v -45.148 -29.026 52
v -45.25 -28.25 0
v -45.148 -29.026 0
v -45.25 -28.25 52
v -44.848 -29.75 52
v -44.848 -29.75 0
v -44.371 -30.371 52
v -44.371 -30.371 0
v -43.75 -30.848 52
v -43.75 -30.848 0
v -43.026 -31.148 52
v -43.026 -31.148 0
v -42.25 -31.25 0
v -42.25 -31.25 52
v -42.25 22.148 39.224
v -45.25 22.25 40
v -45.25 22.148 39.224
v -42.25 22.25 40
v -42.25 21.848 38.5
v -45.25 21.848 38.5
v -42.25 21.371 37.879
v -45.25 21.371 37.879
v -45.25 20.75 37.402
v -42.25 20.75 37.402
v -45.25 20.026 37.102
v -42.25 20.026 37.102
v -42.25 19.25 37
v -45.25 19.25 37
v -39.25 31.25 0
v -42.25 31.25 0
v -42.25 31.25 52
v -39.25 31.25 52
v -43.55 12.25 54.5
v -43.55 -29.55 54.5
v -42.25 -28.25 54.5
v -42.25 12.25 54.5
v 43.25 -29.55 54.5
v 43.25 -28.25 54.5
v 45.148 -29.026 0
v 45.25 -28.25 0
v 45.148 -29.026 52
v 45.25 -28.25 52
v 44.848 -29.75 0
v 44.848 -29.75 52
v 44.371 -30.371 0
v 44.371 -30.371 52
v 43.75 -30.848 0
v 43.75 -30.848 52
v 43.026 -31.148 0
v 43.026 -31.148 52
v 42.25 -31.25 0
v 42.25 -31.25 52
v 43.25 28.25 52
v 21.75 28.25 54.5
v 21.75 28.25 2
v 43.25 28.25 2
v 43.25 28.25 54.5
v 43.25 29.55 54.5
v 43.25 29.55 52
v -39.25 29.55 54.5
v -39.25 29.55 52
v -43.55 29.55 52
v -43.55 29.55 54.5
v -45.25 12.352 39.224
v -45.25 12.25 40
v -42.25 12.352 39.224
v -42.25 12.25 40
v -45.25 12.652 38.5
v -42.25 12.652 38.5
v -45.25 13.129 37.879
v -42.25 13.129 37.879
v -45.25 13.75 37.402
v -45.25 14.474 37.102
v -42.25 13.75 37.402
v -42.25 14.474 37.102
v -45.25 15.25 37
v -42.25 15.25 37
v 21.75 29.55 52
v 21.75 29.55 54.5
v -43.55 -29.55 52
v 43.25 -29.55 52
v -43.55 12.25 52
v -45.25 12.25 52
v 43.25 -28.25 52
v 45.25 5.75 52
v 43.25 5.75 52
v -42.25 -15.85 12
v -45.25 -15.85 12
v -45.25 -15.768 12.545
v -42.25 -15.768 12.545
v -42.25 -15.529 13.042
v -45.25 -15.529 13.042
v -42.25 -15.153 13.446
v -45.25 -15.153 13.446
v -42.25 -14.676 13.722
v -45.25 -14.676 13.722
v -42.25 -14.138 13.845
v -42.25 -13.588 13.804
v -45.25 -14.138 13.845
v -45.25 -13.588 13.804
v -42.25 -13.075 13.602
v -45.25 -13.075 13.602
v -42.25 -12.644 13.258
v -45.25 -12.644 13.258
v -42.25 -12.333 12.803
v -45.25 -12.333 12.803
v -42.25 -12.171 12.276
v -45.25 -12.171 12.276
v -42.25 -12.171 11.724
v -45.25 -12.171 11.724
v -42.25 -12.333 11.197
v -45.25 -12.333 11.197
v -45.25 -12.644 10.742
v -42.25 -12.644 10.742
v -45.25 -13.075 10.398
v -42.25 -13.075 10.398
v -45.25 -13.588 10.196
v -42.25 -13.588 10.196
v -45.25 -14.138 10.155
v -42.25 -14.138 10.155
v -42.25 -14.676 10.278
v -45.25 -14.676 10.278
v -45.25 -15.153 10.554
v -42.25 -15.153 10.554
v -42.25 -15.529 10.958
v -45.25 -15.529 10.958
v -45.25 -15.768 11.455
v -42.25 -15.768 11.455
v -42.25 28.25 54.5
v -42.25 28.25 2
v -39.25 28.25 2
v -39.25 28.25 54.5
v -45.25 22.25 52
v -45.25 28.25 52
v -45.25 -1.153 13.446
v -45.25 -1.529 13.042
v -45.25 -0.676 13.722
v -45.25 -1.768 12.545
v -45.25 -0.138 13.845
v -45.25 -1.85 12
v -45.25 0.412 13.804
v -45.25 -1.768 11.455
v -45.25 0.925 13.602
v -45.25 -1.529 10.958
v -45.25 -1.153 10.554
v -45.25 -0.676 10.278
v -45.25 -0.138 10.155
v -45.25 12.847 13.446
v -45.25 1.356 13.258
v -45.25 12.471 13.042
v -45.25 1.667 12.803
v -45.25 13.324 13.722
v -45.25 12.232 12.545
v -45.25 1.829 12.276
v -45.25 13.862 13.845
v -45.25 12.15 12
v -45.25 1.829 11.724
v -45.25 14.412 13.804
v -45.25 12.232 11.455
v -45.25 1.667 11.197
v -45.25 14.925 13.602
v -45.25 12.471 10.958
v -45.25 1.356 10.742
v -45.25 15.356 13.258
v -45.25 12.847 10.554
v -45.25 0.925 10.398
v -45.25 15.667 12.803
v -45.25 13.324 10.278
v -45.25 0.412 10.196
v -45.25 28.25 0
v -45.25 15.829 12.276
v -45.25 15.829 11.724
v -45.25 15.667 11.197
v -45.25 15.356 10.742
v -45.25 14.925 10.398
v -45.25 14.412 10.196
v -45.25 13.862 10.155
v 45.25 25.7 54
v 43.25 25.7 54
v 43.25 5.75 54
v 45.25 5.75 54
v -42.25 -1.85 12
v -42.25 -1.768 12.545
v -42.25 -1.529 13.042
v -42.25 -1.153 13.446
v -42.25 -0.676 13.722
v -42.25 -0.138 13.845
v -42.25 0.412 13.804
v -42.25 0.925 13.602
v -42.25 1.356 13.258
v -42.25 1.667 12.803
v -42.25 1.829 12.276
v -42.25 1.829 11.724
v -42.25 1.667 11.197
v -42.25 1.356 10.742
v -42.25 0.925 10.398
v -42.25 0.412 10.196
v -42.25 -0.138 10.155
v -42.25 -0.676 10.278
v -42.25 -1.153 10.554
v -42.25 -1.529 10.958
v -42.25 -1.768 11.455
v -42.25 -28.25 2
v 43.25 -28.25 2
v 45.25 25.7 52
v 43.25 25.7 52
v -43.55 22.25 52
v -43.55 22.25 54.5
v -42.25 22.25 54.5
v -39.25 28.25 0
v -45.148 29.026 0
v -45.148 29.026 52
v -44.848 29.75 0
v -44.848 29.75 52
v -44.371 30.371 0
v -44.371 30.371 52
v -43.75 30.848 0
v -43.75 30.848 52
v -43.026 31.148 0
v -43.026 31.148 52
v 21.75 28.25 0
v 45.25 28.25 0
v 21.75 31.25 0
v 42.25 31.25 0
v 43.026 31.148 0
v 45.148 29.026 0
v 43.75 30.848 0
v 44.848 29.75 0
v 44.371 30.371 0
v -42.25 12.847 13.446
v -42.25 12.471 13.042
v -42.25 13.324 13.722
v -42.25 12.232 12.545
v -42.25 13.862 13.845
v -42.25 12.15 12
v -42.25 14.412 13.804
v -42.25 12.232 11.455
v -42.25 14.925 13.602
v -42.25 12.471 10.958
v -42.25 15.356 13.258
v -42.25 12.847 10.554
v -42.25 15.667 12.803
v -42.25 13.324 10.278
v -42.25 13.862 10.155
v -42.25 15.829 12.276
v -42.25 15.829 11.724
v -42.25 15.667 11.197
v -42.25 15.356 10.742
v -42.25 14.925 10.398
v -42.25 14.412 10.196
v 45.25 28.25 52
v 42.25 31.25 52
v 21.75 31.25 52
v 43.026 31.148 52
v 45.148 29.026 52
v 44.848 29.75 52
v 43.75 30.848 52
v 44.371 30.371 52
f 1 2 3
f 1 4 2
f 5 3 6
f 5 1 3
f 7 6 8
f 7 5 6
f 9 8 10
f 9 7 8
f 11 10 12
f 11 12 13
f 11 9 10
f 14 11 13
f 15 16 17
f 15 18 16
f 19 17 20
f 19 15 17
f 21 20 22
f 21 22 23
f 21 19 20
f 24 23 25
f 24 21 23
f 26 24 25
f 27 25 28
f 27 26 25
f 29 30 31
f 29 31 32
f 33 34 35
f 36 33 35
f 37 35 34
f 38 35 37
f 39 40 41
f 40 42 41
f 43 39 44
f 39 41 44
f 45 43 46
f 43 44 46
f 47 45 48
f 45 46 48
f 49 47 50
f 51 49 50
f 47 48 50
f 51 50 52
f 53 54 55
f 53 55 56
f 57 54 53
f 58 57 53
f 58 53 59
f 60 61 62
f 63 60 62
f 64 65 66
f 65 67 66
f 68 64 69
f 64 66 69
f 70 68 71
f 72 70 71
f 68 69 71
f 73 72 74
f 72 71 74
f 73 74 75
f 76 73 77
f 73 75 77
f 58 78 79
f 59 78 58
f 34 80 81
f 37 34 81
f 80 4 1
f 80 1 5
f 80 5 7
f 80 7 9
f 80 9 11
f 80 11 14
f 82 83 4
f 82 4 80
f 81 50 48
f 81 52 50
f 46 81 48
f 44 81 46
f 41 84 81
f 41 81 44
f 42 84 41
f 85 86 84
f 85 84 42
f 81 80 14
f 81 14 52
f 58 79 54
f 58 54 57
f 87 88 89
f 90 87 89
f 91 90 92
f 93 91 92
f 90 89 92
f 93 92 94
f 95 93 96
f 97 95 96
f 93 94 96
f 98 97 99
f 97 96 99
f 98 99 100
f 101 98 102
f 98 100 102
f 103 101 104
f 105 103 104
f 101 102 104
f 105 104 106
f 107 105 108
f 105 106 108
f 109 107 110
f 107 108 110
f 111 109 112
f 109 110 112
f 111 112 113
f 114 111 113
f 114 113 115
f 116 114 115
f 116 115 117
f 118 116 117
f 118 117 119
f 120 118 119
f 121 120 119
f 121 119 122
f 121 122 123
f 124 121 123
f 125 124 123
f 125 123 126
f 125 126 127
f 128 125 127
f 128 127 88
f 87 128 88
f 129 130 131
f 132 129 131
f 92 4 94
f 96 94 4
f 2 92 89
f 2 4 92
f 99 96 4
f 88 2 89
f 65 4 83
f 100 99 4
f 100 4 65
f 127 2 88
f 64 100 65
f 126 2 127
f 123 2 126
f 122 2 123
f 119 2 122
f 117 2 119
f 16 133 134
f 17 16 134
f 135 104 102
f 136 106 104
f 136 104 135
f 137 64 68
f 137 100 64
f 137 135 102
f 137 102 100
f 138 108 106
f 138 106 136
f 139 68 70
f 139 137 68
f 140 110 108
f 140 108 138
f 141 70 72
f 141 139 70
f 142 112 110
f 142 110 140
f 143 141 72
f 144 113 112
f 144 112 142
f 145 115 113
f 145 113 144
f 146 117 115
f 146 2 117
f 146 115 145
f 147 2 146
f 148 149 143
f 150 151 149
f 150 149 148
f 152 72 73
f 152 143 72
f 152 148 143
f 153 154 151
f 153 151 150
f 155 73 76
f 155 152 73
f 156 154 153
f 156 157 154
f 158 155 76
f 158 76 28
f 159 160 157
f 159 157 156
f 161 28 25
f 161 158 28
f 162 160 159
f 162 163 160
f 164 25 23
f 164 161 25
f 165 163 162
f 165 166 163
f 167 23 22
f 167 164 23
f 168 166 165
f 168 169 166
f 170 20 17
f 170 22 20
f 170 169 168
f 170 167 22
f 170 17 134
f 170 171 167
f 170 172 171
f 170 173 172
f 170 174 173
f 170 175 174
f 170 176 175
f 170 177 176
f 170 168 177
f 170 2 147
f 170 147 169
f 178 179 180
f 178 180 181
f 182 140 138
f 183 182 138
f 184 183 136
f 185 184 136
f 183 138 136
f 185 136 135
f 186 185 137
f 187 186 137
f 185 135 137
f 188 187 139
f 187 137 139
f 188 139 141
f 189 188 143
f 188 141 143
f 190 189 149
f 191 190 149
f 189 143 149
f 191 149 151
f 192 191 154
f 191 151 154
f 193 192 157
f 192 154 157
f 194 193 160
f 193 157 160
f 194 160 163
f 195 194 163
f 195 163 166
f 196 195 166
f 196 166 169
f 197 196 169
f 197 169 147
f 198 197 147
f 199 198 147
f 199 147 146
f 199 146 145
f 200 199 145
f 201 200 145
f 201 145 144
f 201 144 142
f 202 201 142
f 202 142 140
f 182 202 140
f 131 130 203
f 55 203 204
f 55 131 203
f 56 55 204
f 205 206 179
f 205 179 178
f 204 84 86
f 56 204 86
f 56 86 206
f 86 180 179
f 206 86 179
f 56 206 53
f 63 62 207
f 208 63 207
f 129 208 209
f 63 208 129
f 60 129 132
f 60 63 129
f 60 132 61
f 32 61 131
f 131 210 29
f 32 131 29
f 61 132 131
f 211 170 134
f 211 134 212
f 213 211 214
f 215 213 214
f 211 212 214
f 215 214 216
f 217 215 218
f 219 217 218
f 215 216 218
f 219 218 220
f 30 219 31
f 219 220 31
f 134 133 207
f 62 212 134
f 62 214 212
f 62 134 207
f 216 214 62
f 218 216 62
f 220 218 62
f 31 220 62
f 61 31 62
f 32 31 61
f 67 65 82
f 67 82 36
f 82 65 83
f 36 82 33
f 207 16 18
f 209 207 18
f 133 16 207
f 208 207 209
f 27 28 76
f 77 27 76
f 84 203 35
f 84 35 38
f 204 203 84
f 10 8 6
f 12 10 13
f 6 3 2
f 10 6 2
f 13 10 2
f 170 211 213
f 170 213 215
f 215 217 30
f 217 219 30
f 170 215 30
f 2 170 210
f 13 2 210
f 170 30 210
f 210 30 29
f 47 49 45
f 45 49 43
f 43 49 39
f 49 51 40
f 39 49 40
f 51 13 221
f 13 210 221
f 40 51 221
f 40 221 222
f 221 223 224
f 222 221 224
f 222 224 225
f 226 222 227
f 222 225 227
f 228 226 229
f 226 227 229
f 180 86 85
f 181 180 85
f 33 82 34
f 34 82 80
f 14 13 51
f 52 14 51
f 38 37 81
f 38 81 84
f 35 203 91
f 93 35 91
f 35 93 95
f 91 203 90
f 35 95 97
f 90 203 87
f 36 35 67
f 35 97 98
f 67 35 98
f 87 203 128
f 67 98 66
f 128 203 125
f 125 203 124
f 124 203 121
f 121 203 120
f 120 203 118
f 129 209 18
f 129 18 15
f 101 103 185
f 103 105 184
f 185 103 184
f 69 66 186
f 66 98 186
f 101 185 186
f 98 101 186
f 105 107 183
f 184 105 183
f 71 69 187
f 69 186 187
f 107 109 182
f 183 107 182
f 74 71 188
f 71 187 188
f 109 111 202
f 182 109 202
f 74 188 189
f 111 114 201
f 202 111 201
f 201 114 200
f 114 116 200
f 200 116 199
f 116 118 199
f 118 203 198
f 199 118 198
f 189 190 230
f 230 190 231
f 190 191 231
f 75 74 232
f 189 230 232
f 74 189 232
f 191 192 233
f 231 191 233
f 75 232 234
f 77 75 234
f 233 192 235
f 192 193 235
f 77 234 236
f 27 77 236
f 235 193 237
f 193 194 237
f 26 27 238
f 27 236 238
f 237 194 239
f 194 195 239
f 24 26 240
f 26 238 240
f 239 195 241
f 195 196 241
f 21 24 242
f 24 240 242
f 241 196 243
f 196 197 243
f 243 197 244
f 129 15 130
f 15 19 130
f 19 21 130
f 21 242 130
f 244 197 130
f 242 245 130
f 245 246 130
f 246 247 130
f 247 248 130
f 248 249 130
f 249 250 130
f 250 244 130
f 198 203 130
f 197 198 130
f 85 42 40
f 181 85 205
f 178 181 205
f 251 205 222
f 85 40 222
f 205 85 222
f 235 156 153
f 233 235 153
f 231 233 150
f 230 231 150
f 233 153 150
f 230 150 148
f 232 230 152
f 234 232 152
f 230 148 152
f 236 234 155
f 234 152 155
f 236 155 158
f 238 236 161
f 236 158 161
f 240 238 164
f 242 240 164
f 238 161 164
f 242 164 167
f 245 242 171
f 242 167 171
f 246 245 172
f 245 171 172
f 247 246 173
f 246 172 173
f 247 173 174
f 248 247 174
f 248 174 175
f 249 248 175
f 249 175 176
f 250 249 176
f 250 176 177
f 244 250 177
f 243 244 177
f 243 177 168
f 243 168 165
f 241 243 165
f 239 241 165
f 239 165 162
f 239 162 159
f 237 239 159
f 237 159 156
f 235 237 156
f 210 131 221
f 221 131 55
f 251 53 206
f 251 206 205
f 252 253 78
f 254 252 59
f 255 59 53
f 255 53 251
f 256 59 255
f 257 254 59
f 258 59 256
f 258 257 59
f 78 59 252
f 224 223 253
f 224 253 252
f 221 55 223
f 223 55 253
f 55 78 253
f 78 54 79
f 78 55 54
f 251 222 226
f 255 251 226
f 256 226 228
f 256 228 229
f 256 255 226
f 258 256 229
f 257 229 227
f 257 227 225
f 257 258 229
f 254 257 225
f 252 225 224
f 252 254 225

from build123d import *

# Parameters (mm, degrees)
SKETCH_W        = 90.5
SKETCH_H        = 62.5
PAD_DEPTH       = 52
SKETCH001_W     = 85.5
SKETCH001_H     = 56.5
POCKET_DEPTH    = 50
SKETCH002_W     = 61
SKETCH002_H     = 3
POCKET001_DEPTH = 52
SKETCH003_W     = 3
SKETCH003_H     = 1.3
SKETCH003_W_2   = 1.3
SKETCH003_H_2   = 57.8
SKETCH003_W_3   = 86.8
SKETCH003_W_4   = 21.5
PAD001_DEPTH    = 2.5
SKETCH004_W     = 2
SKETCH004_H     = 19.95
PAD002_DEPTH    = 2
PAD003_DEPTH    = 2
FILLET_R        = 3
SKETCH005_W     = 10
SKETCH005_H     = 18
POCKET002_DEPTH = 5
FILLET001_R     = 3
SKETCH006_R     = 1.85
POCKET003_DEPTH = 5


with BuildPart() as part:
    # Sketch → Pad (new body)
    with BuildSketch(Plane.XY):
        Rectangle(SKETCH_W, SKETCH_H)
    extrude(amount=PAD_DEPTH)

    # Sketch001 (on Face6 of Pad) → Pocket (cut)
    with BuildSketch(Plane.XY.offset(52)):
        with Locations((0.5, 0)):
            Rectangle(SKETCH001_W, SKETCH001_H)
    extrude(amount=-POCKET_DEPTH, mode=Mode.SUBTRACT)

    # Sketch002 (on Face5 of Pocket) → Pocket001 (cut)
    with BuildSketch(Plane.XY.offset(52)):
        with Locations((-8.75, 29.75)):
            Rectangle(SKETCH002_W, SKETCH002_H)
    extrude(amount=-POCKET001_DEPTH, mode=Mode.SUBTRACT)

    # Sketch003 (on Face4 of Pocket001) → Pad001 (join)
    with BuildSketch(Plane.XY.offset(52)):
        with Locations((-40.75, 28.9)):
            Rectangle(SKETCH003_W, SKETCH003_H)
        with Locations((-42.9, 0.65)):
            Rectangle(SKETCH003_W_2, SKETCH003_H_2)
        with Locations((-0.15, -28.9)):
            Rectangle(SKETCH003_W_3, SKETCH003_H)
        with Locations((32.5, 28.9)):
            Rectangle(SKETCH003_W_4, SKETCH003_H)
    extrude(amount=PAD001_DEPTH)

    # Sketch004 (on Face4 of Pad001) → Pad002 (join)
    with BuildSketch(Plane.XY.offset(52)):
        with Locations((44.25, 15.725)):
            Rectangle(SKETCH004_W, SKETCH004_H)
    extrude(amount=PAD002_DEPTH)

    # Sketch004 (on Face4 of Pad001) → Pad003 (join)
    with BuildSketch(Plane.XY.offset(52)):
        with Locations((44.25, 15.725)):
            Rectangle(SKETCH004_W, SKETCH004_H)
    extrude(amount=PAD003_DEPTH)

    # Fillet
    fillet_edges = [part.edges().sort_by_distance(p)[0] for p in [
        (45.25, 31.25, 26),
        (45.25, -31.25, 26),
        (-45.25, 31.25, 26),
        (-45.25, -31.25, 26),
    ]]
    fillet(fillet_edges, radius=FILLET_R)

    # Sketch005 (on Face6 of Fillet) → Pocket002 (cut)
    with BuildSketch(Plane(origin=(-45.25, 0, 0), x_dir=(0, -1, 0), z_dir=(-1, 0, 0))):
        with Locations((-17.25, 46)):
            Rectangle(SKETCH005_W, SKETCH005_H)
    extrude(amount=-POCKET002_DEPTH, mode=Mode.SUBTRACT)

    # Fillet001
    fillet001_edges = [part.edges().sort_by_distance(p)[0] for p in [
        (-43.75, 22.25, 37),
        (-43.75, 12.25, 37),
    ]]
    fillet(fillet001_edges, radius=FILLET001_R)

    # Sketch006 (on Face1 of Fillet001) → Pocket003 (cut)
    with BuildSketch(Plane(origin=(-45.25, 0, 0), x_dir=(0, -1, 0), z_dir=(-1, 0, 0))):
        with Locations((-14, 12)):
            Circle(SKETCH006_R)
        with Locations((0, 12)):
            Circle(SKETCH006_R)
        with Locations((14, 12)):
            Circle(SKETCH006_R)
    extrude(amount=-POCKET003_DEPTH, mode=Mode.SUBTRACT)


solid = part.part
